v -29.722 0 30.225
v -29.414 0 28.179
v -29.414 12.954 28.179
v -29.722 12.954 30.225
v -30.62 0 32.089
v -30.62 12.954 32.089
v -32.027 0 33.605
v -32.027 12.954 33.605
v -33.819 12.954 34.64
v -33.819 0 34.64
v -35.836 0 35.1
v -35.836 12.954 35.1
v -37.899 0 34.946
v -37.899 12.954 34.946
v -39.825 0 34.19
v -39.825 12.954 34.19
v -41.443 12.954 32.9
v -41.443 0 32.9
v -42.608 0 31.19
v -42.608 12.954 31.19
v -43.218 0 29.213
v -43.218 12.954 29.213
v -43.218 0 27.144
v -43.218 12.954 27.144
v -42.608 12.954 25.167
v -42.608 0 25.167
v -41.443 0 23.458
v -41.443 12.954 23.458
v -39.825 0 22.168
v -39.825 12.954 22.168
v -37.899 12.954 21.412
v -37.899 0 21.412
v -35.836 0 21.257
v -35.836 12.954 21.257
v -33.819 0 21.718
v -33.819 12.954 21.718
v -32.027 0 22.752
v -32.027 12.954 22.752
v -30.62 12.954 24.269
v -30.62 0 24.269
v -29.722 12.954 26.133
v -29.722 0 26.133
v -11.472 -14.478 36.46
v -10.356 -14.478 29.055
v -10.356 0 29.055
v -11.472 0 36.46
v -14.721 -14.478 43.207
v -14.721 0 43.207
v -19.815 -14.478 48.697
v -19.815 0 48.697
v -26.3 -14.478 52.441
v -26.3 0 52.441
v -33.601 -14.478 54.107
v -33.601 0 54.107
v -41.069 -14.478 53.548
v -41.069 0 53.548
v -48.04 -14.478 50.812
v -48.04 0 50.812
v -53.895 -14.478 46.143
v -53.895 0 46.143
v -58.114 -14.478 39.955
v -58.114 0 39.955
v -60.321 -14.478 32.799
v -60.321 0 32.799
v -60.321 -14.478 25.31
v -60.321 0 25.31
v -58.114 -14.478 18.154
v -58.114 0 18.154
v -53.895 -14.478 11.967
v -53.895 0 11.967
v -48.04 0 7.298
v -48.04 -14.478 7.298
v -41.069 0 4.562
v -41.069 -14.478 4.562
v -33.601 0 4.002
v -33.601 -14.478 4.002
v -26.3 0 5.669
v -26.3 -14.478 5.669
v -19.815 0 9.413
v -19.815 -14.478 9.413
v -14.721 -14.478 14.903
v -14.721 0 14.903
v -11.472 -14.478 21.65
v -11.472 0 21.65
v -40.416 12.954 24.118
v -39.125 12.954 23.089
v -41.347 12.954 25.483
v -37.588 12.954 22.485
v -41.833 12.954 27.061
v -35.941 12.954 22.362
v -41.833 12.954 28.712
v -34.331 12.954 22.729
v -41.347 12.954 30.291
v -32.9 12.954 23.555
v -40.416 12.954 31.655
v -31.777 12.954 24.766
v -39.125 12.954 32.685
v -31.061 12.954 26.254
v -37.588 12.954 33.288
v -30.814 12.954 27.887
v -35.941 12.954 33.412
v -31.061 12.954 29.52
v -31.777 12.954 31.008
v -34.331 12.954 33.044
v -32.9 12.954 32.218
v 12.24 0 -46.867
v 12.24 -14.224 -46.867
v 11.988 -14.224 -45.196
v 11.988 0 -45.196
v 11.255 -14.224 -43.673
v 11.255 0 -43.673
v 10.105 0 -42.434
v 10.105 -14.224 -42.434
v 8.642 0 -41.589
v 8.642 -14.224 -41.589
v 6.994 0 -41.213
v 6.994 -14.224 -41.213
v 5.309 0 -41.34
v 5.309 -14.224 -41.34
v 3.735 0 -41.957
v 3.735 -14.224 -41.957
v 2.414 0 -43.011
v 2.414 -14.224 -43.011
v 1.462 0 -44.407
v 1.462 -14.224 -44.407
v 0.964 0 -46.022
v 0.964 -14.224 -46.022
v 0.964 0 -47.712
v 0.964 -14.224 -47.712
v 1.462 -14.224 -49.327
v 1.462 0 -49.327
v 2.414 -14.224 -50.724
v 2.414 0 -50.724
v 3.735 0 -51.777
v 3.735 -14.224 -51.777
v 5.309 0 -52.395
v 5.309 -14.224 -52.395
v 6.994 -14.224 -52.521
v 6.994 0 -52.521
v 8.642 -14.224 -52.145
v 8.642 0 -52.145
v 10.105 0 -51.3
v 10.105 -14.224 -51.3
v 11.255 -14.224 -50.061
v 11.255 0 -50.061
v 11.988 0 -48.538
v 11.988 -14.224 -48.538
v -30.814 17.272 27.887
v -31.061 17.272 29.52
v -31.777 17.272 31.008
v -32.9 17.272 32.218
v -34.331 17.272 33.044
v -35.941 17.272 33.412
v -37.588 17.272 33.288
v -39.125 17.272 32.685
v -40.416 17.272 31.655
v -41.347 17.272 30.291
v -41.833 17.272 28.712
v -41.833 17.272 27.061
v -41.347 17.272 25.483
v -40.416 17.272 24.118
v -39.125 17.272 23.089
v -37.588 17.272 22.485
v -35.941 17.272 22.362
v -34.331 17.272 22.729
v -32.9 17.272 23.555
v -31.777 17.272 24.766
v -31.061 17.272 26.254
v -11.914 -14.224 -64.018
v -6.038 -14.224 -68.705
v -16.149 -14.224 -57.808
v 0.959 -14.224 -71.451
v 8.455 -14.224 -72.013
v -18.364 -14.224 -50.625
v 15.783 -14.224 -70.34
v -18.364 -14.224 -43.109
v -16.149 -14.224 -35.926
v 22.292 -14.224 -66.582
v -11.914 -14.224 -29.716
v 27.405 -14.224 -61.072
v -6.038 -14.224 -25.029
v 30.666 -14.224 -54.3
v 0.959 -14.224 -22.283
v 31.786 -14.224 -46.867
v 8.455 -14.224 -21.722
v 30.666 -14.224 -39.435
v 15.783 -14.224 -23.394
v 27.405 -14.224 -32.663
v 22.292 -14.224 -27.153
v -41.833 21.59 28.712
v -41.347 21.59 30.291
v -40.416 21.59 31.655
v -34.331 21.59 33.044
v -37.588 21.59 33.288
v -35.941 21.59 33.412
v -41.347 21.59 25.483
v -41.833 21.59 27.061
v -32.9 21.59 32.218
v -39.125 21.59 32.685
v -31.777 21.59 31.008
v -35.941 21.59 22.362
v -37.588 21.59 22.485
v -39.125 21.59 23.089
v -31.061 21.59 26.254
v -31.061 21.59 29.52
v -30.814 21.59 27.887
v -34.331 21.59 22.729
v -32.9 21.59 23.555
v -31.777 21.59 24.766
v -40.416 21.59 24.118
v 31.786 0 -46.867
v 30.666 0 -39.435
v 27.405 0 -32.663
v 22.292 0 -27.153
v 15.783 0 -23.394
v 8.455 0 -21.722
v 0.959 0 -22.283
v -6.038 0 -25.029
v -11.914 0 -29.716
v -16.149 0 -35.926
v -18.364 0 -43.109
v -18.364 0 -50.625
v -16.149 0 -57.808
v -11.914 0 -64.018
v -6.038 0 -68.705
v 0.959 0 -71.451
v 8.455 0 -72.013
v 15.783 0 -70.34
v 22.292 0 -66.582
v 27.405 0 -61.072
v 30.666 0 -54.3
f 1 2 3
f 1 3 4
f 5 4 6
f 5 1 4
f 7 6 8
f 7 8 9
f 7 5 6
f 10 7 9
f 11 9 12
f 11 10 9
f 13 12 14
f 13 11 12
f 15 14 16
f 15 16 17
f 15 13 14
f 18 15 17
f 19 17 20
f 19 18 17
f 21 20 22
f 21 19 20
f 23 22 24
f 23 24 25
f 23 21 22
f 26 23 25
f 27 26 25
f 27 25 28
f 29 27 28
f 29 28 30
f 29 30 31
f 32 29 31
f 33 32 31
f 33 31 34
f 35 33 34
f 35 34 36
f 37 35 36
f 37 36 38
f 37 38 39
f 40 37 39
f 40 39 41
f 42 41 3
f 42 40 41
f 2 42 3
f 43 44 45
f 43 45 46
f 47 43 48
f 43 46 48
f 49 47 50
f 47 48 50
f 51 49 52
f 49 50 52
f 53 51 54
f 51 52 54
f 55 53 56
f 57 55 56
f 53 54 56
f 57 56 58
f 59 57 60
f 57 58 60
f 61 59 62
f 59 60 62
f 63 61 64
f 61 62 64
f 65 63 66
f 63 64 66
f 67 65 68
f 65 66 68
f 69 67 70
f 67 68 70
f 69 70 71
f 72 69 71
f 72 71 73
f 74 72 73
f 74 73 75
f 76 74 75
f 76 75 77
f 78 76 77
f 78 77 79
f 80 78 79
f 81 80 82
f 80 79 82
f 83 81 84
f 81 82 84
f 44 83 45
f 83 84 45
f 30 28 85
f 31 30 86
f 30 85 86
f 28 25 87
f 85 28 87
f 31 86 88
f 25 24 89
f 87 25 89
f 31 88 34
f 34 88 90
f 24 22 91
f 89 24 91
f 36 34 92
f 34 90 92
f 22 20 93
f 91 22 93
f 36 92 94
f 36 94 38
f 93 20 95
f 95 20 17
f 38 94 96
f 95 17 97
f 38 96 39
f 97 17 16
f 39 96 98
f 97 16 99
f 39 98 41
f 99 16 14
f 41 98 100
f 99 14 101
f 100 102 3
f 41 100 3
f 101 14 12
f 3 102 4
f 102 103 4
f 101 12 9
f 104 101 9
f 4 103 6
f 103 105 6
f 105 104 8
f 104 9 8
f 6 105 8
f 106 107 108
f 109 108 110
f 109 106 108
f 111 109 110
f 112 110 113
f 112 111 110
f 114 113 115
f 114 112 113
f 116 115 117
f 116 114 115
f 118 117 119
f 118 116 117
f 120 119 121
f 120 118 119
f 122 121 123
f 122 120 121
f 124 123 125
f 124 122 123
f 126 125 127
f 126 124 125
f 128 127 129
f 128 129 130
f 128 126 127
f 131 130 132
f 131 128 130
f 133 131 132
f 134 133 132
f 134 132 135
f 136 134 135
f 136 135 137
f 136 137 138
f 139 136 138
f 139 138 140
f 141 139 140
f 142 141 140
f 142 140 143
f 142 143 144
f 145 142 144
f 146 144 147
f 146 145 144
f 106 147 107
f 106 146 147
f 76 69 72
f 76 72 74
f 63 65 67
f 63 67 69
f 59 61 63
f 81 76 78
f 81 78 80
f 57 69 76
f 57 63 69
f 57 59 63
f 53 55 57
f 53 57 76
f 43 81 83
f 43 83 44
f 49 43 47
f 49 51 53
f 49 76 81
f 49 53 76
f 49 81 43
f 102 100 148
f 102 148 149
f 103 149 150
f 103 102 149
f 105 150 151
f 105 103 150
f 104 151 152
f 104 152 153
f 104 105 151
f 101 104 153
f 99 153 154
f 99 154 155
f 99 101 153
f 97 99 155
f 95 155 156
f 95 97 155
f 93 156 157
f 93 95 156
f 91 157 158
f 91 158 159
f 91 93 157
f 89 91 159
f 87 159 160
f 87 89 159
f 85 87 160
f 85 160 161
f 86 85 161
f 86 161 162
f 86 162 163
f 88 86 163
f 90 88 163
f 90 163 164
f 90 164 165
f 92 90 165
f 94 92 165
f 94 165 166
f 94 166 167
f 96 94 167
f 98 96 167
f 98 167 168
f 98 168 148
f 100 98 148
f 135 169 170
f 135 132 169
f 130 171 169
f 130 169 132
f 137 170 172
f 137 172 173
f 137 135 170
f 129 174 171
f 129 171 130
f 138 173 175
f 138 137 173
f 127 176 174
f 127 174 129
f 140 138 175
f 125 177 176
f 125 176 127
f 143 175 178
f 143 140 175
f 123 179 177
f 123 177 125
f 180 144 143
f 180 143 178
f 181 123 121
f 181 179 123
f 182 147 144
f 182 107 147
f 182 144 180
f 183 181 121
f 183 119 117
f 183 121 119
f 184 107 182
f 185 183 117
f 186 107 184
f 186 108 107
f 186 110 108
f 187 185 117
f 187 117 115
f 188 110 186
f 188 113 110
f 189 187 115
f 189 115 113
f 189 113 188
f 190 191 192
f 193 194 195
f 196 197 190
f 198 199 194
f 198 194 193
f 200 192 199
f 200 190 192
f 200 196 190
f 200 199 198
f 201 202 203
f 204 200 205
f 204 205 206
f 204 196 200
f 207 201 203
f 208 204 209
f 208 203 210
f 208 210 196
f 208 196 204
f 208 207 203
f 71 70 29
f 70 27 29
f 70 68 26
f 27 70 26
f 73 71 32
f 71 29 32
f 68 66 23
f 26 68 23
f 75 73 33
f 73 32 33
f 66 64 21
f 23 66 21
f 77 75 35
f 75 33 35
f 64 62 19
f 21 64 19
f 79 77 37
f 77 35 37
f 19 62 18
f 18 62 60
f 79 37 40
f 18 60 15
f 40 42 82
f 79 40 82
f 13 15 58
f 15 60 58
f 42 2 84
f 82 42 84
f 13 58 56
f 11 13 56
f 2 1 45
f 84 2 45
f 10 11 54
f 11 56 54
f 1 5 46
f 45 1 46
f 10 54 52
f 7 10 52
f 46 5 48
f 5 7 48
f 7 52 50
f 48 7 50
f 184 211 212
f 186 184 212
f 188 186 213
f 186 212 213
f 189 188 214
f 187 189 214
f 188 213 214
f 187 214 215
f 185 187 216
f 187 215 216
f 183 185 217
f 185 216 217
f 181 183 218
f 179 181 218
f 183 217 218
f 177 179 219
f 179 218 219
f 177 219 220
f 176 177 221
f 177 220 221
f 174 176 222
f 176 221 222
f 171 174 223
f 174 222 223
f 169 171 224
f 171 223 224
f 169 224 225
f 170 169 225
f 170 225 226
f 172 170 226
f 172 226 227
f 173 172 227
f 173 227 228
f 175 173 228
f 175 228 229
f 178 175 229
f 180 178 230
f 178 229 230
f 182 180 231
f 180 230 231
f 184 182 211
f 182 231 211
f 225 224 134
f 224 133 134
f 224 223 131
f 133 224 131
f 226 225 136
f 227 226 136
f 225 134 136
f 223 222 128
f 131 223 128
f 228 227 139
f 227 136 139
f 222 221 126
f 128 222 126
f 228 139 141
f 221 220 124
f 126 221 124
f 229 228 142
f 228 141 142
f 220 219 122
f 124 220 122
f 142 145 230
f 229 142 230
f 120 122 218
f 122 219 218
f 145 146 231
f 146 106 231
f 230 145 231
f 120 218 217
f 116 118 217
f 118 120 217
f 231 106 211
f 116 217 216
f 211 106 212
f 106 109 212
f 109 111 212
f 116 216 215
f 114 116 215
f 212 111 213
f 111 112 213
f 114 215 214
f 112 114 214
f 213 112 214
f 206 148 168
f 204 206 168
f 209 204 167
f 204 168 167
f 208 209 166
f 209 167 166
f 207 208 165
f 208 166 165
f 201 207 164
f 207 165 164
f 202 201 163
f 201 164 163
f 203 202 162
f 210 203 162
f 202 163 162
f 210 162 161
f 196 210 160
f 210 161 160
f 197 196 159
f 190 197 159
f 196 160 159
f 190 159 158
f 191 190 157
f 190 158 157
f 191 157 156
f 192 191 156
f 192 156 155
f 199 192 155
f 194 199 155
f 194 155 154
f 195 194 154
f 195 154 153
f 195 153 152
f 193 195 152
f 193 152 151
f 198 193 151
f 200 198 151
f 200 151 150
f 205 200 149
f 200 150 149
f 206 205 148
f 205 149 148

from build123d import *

# Parameters (mm, degrees)
F0_R      = 25.1228109889
F1_DEPTH  = 14.478
F2_R      = 5.5404486576
F3_DEPTH  = 17.272
F4_R      = 25.2159750878
F4_R_2    = 5.669759619
F5_DEPTH  = 14.224
F6_R      = 6.940934254
F6_R_2    = 3.7960935957
F7_DEPTH  = 12.954
F8_R      = 3.6588389903
F8_R_2    = 2.3542381967
F3_FACE_R = 5.5404486576
F9_DEPTH  = 4.318


with BuildPart() as f1:
    # F0 (on Front) → F1 (new body)
    with BuildSketch(Plane.XZ):
        with Locations((-35.4788862169, 29.0547255427)):
            Circle(F0_R)
    extrude(amount=F1_DEPTH)

    # F2 (on Front) → F3 (join)
    with BuildSketch(Plane.XZ):
        with Locations((-36.3549105823, 27.8866980225)):
            Circle(F2_R)
    extrude(amount=-F3_DEPTH)

    # F6 (on Front) → F7 (join)
    with BuildSketch(Plane.XZ):
        with Locations((-36.3549105823, 28.1787049025)):
            Circle(F6_R)
        with Locations((-36.3549105823, 28.1787049025)):
            Circle(F6_R_2, mode=Mode.SUBTRACT)
    extrude(amount=-F7_DEPTH)

    # F8 (on Front) + F3_face (on face) → F9 (join)
    with BuildSketch(Plane.XZ):
        with Locations((-36.3549105823, 27.3026842624)):
            Circle(F8_R)
        with Locations((-36.3549105823, 27.3026842624)):
            Circle(F8_R_2, mode=Mode.SUBTRACT)
    with BuildSketch(Plane(origin=(-36.3549105823, 17.272, 27.8866980225), x_dir=(1, 0, 0), z_dir=(0, 1, 0))):
        Circle(F3_FACE_R)
    extrude(amount=-F9_DEPTH, dir=(0, -1, 0))


with BuildPart() as f5:
    # F4 (on Front) → F5 (new body)
    with BuildSketch(Plane.XZ):
        with Locations((6.5701655112, -46.8671731651)):
            Circle(F4_R)
        with Locations((6.5701655112, -46.8671731651)):
            Circle(F4_R_2, mode=Mode.SUBTRACT)
    extrude(amount=F5_DEPTH)


solid = Compound([f1.part, f5.part])
